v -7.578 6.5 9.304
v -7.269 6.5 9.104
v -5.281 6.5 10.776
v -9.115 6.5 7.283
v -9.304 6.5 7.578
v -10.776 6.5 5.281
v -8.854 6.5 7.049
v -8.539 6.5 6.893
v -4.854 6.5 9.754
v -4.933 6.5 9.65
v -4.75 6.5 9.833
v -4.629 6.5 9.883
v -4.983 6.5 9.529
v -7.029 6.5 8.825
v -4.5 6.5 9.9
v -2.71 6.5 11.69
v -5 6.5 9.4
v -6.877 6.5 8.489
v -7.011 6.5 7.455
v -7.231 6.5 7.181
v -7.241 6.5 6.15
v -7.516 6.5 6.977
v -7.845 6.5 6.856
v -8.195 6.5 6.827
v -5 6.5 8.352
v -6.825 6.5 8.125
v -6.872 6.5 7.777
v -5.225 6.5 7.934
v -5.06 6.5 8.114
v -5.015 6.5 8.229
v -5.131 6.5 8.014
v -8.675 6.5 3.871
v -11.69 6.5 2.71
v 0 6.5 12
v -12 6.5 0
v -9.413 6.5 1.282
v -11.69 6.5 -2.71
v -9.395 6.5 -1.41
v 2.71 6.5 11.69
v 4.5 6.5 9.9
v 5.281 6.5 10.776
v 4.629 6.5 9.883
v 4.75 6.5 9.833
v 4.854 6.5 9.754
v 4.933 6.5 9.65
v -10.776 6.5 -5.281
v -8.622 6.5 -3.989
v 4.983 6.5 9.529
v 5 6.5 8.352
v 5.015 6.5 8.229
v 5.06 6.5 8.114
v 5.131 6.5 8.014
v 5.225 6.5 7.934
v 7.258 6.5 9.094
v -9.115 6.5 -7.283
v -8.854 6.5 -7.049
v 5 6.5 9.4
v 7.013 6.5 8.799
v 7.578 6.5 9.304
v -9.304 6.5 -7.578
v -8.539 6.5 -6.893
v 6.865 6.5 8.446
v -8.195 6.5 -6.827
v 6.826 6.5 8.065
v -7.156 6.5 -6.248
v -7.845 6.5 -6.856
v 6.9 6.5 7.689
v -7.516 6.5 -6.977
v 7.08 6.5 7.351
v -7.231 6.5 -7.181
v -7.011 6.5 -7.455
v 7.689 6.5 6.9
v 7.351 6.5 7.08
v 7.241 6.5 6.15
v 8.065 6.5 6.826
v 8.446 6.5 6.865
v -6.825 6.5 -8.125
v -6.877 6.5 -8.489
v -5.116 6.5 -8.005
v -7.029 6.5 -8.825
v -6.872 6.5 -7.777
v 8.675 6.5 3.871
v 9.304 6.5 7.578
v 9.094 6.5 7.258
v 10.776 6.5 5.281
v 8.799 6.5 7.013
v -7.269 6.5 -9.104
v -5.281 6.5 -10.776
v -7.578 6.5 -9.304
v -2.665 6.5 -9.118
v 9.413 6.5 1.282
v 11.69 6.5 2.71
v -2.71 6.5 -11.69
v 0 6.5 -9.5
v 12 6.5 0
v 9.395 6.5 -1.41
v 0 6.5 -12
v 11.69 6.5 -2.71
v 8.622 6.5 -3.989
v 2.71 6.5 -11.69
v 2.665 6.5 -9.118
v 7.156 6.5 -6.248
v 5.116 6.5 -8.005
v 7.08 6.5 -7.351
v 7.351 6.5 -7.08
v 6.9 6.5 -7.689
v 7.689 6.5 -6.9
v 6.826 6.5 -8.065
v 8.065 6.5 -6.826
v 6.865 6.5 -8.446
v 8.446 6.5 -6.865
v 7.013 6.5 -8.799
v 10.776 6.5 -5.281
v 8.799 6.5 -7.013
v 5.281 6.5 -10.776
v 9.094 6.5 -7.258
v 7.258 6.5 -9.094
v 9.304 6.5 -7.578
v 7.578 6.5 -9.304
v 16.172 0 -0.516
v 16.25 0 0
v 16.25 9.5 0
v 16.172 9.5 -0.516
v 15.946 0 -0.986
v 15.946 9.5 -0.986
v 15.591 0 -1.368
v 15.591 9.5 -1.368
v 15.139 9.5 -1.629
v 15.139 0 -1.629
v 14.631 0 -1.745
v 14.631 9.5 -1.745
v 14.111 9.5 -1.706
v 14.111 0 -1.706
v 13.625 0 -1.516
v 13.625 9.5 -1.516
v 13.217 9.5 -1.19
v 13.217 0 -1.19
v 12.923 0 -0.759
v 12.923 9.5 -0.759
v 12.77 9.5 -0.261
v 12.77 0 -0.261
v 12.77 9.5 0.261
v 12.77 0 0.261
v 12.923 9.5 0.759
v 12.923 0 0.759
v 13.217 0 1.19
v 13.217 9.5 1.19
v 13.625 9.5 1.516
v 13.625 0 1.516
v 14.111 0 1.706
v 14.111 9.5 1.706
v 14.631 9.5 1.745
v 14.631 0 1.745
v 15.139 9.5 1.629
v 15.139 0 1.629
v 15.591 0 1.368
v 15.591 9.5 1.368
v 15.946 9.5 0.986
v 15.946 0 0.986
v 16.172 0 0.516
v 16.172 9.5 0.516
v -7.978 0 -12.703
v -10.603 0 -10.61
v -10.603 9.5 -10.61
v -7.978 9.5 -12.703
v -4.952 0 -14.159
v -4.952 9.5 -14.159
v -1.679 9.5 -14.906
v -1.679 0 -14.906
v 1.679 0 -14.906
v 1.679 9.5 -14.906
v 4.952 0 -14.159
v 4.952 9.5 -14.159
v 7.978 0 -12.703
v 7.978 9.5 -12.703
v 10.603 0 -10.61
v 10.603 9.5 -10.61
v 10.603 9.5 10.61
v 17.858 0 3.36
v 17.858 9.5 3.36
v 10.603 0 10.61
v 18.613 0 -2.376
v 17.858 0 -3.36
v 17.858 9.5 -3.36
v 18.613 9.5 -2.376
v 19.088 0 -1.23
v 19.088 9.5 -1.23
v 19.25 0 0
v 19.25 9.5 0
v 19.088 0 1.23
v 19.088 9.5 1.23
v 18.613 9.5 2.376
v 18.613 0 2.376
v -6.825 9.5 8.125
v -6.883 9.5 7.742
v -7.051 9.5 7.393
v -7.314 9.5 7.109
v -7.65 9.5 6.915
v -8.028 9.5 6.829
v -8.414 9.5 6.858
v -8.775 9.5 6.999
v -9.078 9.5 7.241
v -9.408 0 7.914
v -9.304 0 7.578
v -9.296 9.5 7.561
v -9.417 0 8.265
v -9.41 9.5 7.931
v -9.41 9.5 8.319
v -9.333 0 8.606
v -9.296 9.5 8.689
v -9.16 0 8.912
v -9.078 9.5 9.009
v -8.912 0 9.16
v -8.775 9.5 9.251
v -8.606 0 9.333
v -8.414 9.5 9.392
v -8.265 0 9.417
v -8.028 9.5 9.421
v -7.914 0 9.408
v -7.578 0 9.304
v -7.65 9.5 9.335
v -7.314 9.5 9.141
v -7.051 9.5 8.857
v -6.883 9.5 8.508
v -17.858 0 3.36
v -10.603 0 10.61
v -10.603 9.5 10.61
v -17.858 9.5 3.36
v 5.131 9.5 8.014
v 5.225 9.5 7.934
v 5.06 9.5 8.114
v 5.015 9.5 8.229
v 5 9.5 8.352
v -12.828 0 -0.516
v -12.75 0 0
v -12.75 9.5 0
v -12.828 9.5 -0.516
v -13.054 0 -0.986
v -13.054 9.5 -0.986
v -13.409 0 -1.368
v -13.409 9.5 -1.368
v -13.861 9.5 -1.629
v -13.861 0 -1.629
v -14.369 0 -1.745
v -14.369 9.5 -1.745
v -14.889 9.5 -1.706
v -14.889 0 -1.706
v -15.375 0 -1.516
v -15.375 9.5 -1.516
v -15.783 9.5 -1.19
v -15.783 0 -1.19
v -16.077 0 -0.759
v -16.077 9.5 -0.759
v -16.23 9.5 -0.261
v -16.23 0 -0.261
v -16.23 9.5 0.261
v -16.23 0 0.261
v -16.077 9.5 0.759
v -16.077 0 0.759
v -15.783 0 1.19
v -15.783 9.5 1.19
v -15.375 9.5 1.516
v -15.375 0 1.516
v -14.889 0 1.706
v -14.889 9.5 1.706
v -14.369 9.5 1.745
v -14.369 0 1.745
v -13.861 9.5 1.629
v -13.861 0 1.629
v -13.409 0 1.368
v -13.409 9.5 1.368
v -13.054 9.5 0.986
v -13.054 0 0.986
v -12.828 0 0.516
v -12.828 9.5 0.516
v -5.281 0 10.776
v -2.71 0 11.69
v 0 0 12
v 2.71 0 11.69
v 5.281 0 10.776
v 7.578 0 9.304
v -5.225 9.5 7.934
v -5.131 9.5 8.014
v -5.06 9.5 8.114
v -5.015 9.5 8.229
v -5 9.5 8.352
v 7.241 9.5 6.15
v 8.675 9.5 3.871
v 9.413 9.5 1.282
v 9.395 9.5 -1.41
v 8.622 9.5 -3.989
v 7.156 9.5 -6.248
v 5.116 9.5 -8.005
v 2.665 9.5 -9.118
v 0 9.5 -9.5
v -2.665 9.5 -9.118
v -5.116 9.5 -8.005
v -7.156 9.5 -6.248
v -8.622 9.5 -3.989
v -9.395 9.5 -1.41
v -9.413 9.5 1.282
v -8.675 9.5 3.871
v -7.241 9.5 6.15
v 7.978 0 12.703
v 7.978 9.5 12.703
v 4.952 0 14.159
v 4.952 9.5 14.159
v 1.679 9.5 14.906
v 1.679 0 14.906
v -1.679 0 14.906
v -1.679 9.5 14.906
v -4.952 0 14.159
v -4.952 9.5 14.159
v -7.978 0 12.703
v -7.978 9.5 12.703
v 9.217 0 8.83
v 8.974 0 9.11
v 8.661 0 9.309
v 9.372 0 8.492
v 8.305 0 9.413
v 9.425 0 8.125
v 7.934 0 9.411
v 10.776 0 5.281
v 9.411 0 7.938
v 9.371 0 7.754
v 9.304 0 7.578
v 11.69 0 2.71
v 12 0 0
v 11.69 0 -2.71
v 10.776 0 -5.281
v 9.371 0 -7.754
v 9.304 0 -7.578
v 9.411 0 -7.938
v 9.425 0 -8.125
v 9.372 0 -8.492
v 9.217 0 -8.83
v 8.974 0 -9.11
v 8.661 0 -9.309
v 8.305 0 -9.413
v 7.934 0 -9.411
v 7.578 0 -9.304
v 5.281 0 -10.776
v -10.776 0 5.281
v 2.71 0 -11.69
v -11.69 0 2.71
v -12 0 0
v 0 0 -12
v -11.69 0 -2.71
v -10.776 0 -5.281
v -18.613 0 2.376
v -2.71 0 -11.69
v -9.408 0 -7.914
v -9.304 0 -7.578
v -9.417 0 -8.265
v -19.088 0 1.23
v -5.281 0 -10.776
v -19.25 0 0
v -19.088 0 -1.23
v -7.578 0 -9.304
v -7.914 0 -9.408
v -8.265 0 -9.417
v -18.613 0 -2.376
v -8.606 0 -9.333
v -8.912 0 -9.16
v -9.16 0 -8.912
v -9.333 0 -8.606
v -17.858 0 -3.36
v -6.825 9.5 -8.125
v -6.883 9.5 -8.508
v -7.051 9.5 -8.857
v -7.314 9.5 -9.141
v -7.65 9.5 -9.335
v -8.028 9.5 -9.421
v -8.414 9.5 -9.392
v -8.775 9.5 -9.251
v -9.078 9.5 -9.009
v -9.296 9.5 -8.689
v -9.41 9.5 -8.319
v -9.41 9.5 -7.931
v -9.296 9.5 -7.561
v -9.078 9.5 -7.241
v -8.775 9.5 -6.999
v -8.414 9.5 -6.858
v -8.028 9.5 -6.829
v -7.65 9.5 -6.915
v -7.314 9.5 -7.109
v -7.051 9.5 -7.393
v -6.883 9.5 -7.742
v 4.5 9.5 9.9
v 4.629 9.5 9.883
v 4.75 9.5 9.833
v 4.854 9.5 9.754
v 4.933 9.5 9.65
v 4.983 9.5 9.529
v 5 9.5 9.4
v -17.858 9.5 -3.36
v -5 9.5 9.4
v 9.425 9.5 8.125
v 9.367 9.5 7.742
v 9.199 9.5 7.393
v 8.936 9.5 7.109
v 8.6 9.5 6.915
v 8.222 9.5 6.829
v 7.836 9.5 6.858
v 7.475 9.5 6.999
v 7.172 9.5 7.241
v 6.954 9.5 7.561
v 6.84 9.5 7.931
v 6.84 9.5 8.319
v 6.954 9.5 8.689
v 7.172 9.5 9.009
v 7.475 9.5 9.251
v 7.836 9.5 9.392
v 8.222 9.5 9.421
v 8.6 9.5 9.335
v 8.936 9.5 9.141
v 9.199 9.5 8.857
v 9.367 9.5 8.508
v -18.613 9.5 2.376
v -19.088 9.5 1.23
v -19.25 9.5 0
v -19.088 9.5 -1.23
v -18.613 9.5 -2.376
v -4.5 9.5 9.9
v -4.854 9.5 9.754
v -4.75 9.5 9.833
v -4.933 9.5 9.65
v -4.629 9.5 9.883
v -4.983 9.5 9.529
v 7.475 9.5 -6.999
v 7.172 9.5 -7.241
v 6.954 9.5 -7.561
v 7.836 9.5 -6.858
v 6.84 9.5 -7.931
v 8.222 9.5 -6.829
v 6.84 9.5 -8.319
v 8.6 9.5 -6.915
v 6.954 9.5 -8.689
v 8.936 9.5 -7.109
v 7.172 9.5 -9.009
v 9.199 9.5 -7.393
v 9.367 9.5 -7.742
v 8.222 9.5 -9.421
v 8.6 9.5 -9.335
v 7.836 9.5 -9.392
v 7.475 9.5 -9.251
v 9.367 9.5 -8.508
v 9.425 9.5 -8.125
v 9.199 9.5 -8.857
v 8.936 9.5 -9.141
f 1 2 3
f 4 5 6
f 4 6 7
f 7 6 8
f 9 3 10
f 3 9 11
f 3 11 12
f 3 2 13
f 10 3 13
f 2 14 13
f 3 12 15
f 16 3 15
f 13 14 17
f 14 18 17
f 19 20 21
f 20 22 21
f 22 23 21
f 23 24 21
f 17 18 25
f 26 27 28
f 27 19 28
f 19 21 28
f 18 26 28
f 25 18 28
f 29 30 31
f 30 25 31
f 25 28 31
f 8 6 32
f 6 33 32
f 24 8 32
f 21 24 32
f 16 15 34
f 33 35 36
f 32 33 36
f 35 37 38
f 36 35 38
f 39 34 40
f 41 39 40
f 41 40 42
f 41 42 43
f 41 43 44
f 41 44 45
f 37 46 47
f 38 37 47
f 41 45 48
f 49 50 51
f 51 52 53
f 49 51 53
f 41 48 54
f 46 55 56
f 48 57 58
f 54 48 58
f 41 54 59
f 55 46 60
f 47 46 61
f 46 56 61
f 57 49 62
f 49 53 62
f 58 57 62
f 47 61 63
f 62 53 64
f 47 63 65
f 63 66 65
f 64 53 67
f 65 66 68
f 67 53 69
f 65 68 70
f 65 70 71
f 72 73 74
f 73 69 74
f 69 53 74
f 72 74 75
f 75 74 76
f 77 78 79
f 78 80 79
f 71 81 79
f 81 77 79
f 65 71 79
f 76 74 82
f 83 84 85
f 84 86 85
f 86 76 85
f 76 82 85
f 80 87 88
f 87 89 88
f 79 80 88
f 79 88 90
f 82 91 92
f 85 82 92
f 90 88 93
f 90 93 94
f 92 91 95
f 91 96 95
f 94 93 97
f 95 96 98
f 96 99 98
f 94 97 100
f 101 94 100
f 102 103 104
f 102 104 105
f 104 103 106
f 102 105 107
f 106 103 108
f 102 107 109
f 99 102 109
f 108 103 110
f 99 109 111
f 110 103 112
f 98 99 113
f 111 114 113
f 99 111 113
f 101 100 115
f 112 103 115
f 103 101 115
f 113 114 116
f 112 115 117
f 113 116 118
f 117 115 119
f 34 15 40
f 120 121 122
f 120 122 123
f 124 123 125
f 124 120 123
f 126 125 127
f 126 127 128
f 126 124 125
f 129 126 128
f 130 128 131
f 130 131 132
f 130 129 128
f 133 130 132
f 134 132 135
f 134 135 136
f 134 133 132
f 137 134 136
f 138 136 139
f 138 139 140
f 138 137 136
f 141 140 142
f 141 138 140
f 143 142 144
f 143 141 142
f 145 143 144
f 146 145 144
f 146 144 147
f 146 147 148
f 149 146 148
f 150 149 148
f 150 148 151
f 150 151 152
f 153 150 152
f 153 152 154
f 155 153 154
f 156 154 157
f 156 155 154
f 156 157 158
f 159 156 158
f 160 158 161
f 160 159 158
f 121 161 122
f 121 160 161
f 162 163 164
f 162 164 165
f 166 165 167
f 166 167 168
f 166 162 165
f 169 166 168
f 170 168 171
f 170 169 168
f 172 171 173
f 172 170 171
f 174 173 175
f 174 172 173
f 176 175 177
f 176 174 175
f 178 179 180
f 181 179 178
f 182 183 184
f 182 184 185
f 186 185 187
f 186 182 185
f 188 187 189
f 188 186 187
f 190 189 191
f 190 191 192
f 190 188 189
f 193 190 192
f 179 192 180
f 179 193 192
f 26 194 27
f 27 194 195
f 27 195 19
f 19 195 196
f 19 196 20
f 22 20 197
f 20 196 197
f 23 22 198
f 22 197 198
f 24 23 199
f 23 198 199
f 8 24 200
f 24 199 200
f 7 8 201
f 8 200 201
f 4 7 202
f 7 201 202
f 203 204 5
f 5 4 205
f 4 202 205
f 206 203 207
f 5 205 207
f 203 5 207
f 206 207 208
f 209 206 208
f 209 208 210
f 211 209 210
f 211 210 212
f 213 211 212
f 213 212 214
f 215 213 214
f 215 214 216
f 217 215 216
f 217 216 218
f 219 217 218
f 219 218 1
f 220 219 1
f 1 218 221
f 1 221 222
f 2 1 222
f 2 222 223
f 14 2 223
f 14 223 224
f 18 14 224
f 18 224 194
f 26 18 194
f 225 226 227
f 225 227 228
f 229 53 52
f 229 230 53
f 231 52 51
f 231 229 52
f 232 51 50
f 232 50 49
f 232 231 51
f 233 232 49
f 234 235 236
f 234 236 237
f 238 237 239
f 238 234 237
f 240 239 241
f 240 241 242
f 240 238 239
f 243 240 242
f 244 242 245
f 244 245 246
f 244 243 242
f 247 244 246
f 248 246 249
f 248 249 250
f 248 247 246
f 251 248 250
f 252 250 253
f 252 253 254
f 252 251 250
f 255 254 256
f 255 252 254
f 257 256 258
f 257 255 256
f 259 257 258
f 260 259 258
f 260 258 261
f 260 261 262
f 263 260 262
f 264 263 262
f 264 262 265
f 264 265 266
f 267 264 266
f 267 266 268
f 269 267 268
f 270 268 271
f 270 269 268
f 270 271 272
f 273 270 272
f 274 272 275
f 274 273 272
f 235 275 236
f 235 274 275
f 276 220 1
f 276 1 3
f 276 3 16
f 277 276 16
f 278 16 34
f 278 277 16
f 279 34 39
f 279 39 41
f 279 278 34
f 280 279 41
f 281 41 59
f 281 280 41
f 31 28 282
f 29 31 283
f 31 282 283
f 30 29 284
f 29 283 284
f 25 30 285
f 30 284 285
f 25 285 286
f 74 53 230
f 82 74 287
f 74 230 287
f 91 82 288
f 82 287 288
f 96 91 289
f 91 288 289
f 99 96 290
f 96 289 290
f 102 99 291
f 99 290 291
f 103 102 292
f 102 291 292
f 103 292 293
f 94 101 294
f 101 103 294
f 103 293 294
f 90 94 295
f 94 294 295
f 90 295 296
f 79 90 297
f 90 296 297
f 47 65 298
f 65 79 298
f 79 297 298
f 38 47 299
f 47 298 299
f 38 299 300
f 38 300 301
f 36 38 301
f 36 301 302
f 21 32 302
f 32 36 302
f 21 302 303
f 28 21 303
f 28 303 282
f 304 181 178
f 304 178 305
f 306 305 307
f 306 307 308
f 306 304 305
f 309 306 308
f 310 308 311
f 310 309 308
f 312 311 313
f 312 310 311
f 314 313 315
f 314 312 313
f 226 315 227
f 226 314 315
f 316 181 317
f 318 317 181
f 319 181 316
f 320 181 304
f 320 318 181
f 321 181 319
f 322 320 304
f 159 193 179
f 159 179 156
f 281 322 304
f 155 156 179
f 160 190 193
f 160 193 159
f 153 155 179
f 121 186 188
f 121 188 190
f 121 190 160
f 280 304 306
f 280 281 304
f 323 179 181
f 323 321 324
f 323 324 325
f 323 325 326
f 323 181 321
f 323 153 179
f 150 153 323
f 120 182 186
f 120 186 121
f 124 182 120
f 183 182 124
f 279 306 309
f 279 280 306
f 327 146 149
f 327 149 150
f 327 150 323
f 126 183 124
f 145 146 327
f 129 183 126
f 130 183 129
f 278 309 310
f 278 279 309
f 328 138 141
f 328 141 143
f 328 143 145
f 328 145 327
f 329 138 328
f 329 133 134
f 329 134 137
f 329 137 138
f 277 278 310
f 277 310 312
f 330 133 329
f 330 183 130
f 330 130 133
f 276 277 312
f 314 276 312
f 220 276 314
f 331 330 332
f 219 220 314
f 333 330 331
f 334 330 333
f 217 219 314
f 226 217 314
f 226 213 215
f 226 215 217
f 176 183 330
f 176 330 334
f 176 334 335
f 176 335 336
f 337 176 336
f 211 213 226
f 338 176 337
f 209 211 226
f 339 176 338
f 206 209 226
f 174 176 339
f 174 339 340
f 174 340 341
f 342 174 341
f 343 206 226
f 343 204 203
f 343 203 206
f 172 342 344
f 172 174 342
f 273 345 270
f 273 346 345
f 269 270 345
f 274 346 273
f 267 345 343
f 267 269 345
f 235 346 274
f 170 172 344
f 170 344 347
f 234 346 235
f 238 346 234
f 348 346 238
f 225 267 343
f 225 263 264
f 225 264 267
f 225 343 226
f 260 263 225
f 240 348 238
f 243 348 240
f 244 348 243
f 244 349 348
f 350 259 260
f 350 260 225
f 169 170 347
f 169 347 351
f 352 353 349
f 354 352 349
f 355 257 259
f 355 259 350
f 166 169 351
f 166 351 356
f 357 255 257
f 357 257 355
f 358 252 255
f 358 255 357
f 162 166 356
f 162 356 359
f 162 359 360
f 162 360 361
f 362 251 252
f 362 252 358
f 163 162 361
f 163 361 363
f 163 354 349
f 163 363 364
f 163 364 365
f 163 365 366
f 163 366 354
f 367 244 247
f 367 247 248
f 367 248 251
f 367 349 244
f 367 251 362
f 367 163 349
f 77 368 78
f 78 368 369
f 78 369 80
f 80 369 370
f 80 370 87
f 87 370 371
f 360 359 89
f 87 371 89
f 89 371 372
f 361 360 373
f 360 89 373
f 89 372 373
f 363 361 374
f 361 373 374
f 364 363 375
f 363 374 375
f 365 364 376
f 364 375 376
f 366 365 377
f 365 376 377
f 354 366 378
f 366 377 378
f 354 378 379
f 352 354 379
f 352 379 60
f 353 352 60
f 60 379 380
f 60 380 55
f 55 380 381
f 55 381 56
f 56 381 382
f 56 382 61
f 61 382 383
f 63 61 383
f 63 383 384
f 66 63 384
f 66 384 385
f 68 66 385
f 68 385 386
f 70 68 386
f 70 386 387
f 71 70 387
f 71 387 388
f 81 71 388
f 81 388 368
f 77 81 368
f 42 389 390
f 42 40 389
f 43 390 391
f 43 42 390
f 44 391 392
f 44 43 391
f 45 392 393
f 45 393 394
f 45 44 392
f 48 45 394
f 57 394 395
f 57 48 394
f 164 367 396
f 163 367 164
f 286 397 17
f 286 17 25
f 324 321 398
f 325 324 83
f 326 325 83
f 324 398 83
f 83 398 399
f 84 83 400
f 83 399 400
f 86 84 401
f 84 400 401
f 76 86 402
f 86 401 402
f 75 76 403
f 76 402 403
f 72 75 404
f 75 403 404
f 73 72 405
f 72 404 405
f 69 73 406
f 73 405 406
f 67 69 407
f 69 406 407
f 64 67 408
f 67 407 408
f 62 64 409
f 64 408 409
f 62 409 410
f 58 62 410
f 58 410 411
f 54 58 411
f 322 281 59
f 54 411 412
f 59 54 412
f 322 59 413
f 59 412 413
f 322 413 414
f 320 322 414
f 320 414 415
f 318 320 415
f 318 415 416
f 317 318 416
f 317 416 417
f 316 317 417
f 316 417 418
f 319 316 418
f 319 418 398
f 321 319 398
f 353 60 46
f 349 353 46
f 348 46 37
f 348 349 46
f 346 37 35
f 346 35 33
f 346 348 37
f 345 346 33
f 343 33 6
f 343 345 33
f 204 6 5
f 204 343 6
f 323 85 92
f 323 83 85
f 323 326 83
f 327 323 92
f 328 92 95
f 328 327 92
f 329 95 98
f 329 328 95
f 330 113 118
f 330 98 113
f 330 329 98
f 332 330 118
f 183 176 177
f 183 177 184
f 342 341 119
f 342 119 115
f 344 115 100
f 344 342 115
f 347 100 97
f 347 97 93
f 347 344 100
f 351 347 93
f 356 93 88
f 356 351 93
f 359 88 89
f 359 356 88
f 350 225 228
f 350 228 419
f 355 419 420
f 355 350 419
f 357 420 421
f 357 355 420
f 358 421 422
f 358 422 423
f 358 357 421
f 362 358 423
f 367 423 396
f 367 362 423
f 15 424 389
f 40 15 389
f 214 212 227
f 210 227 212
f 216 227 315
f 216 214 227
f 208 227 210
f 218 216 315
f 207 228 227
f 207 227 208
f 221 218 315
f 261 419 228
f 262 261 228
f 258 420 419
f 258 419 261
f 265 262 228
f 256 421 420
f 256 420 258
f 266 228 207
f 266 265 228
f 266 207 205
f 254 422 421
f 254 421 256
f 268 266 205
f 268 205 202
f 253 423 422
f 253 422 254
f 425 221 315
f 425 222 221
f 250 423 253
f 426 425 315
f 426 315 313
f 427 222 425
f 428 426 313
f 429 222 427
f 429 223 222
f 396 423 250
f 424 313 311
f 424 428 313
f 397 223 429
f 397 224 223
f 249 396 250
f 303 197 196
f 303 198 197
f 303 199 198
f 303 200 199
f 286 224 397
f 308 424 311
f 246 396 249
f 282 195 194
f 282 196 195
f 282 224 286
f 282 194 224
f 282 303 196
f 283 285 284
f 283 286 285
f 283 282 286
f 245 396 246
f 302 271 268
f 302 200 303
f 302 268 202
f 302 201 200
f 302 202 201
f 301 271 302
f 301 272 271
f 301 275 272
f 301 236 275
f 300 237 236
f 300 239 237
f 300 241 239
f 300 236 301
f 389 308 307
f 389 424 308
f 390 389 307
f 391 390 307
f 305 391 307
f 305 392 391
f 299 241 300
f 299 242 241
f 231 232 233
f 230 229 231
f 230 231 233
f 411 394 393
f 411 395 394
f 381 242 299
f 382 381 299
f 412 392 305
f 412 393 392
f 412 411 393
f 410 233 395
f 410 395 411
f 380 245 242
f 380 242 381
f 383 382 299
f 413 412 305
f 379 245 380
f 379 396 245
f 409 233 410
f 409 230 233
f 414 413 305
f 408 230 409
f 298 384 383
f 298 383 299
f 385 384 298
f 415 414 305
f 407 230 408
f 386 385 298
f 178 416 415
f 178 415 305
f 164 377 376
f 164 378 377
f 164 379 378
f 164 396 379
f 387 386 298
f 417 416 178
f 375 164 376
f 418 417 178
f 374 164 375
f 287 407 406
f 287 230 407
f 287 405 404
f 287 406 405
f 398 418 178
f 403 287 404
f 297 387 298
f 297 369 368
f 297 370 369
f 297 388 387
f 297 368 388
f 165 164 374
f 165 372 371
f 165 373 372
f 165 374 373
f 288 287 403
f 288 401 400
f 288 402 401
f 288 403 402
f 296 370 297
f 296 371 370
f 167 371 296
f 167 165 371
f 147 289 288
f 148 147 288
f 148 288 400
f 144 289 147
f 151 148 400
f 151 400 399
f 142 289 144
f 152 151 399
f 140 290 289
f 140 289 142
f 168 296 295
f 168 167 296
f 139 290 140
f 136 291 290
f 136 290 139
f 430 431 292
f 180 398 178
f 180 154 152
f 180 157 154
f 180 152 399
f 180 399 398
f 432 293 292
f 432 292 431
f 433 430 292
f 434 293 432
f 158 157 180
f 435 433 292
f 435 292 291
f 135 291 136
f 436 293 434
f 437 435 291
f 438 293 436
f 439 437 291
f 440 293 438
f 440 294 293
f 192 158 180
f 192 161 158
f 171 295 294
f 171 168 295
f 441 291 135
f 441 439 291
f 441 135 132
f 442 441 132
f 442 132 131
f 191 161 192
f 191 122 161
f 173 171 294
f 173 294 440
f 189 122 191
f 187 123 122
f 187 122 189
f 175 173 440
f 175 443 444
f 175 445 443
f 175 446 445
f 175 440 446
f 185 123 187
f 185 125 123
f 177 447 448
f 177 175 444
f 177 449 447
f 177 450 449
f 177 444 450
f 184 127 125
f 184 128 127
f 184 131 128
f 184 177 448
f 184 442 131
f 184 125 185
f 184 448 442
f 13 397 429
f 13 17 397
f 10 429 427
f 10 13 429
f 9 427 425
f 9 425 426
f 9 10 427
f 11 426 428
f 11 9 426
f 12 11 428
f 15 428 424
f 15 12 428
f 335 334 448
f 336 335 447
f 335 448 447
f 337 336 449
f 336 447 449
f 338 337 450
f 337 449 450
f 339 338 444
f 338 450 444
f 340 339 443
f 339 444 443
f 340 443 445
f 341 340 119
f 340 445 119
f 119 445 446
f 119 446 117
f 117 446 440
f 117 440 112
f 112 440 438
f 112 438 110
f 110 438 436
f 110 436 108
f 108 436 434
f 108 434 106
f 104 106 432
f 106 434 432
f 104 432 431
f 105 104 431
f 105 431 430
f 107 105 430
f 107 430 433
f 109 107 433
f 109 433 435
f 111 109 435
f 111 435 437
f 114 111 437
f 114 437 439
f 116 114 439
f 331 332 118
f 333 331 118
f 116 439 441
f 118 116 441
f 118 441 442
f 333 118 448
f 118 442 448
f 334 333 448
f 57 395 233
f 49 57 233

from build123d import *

# Parameters (mm, degrees)
SKETCH1_R           = 12
SKETCH1_R_2         = 1.75
BOSS_EXTRUDE1_DEPTH = 9.5
SKETCH3_R           = 12
SKETCH3_R_2         = 9.5
BOSS_EXTRUDE2_DEPTH = 3
SKETCH4_R           = 1.3
CUT_EXTRUDE1_DEPTH  = 10.5
SKETCH5_W           = 10
SKETCH5_H           = 5
CUT_EXTRUDE2_DEPTH  = 3
FILLET1_R           = 0.5


with BuildPart() as part:
    # Sketch1 → Boss-Extrude1 (new body)
    with BuildSketch(Plane(origin=(0, 0, 0), x_dir=(1, 0, 0), z_dir=(0, 1, 0))):
        with BuildLine():
            Line((-17.857758621, 3.359755504), (-10.603448276, 10.609754222))
            ThreePointArc((-10.603448276, 10.609754222), (0, 15), (10.603448276, 10.609754222))
            Line((10.603448276, 10.609754222), (17.857758621, 3.359755504))
            ThreePointArc((17.857758621, 3.359755504), (19.25, 0), (17.857758621, -3.359755504))
            Line((17.857758621, -3.359755504), (10.603448276, -10.609754222))
            ThreePointArc((10.603448276, -10.609754222), (0, -15), (-10.603448276, -10.609754222))
            Line((-10.603448276, -10.609754222), (-17.857758621, -3.359755504))
            ThreePointArc((-17.857758621, -3.359755504), (-19.25, 0), (-17.857758621, 3.359755504))
        make_face()
        Circle(SKETCH1_R, mode=Mode.SUBTRACT)
        with Locations((-14.5, 0)):
            Circle(SKETCH1_R_2, mode=Mode.SUBTRACT)
        with Locations((14.5, 0)):
            Circle(SKETCH1_R_2, mode=Mode.SUBTRACT)
    extrude(amount=BOSS_EXTRUDE1_DEPTH)

    # Sketch3 → Boss-Extrude2 (add)
    with BuildSketch(Plane(origin=(0, 9.5, 0), x_dir=(1, 0, 0), z_dir=(0, 1, 0))):
        Circle(SKETCH3_R)
        Circle(SKETCH3_R_2, mode=Mode.SUBTRACT)
    extrude(amount=-BOSS_EXTRUDE2_DEPTH)

    # Sketch4 → Cut-Extrude1 (cut, through all)
    with BuildSketch(Plane(origin=(0, 9.5, 0), x_dir=(1, 0, 0), z_dir=(0, 1, 0))):
        with Locations((8.125, 8.125)):
            Circle(SKETCH4_R)
        with Locations((-8.125, 8.125)):
            Circle(SKETCH4_R)
        with Locations((-8.125, -8.125)):
            Circle(SKETCH4_R)
        with Locations((8.125, -8.125)):
            Circle(SKETCH4_R)
    extrude(amount=-CUT_EXTRUDE1_DEPTH, mode=Mode.SUBTRACT)

    # Sketch5 → Cut-Extrude2 (cut)
    with BuildSketch(Plane(origin=(0, 9.5, 0), x_dir=(1, 0, 0), z_dir=(0, 1, 0))):
        with Locations((0, -7.4)):
            Rectangle(SKETCH5_W, SKETCH5_H)
    extrude(amount=-CUT_EXTRUDE2_DEPTH, mode=Mode.SUBTRACT)

    # Fillet1
    fillet1_edges = [part.edges().sort_by_distance(p)[0] for p in [
        (-5, 8, 8.077747211),
        (5, 8, 8.077747211),
        (-5, 8, 9.9),
        (5, 8, 9.9),
    ]]
    fillet(fillet1_edges, radius=FILLET1_R)


solid = part.part
